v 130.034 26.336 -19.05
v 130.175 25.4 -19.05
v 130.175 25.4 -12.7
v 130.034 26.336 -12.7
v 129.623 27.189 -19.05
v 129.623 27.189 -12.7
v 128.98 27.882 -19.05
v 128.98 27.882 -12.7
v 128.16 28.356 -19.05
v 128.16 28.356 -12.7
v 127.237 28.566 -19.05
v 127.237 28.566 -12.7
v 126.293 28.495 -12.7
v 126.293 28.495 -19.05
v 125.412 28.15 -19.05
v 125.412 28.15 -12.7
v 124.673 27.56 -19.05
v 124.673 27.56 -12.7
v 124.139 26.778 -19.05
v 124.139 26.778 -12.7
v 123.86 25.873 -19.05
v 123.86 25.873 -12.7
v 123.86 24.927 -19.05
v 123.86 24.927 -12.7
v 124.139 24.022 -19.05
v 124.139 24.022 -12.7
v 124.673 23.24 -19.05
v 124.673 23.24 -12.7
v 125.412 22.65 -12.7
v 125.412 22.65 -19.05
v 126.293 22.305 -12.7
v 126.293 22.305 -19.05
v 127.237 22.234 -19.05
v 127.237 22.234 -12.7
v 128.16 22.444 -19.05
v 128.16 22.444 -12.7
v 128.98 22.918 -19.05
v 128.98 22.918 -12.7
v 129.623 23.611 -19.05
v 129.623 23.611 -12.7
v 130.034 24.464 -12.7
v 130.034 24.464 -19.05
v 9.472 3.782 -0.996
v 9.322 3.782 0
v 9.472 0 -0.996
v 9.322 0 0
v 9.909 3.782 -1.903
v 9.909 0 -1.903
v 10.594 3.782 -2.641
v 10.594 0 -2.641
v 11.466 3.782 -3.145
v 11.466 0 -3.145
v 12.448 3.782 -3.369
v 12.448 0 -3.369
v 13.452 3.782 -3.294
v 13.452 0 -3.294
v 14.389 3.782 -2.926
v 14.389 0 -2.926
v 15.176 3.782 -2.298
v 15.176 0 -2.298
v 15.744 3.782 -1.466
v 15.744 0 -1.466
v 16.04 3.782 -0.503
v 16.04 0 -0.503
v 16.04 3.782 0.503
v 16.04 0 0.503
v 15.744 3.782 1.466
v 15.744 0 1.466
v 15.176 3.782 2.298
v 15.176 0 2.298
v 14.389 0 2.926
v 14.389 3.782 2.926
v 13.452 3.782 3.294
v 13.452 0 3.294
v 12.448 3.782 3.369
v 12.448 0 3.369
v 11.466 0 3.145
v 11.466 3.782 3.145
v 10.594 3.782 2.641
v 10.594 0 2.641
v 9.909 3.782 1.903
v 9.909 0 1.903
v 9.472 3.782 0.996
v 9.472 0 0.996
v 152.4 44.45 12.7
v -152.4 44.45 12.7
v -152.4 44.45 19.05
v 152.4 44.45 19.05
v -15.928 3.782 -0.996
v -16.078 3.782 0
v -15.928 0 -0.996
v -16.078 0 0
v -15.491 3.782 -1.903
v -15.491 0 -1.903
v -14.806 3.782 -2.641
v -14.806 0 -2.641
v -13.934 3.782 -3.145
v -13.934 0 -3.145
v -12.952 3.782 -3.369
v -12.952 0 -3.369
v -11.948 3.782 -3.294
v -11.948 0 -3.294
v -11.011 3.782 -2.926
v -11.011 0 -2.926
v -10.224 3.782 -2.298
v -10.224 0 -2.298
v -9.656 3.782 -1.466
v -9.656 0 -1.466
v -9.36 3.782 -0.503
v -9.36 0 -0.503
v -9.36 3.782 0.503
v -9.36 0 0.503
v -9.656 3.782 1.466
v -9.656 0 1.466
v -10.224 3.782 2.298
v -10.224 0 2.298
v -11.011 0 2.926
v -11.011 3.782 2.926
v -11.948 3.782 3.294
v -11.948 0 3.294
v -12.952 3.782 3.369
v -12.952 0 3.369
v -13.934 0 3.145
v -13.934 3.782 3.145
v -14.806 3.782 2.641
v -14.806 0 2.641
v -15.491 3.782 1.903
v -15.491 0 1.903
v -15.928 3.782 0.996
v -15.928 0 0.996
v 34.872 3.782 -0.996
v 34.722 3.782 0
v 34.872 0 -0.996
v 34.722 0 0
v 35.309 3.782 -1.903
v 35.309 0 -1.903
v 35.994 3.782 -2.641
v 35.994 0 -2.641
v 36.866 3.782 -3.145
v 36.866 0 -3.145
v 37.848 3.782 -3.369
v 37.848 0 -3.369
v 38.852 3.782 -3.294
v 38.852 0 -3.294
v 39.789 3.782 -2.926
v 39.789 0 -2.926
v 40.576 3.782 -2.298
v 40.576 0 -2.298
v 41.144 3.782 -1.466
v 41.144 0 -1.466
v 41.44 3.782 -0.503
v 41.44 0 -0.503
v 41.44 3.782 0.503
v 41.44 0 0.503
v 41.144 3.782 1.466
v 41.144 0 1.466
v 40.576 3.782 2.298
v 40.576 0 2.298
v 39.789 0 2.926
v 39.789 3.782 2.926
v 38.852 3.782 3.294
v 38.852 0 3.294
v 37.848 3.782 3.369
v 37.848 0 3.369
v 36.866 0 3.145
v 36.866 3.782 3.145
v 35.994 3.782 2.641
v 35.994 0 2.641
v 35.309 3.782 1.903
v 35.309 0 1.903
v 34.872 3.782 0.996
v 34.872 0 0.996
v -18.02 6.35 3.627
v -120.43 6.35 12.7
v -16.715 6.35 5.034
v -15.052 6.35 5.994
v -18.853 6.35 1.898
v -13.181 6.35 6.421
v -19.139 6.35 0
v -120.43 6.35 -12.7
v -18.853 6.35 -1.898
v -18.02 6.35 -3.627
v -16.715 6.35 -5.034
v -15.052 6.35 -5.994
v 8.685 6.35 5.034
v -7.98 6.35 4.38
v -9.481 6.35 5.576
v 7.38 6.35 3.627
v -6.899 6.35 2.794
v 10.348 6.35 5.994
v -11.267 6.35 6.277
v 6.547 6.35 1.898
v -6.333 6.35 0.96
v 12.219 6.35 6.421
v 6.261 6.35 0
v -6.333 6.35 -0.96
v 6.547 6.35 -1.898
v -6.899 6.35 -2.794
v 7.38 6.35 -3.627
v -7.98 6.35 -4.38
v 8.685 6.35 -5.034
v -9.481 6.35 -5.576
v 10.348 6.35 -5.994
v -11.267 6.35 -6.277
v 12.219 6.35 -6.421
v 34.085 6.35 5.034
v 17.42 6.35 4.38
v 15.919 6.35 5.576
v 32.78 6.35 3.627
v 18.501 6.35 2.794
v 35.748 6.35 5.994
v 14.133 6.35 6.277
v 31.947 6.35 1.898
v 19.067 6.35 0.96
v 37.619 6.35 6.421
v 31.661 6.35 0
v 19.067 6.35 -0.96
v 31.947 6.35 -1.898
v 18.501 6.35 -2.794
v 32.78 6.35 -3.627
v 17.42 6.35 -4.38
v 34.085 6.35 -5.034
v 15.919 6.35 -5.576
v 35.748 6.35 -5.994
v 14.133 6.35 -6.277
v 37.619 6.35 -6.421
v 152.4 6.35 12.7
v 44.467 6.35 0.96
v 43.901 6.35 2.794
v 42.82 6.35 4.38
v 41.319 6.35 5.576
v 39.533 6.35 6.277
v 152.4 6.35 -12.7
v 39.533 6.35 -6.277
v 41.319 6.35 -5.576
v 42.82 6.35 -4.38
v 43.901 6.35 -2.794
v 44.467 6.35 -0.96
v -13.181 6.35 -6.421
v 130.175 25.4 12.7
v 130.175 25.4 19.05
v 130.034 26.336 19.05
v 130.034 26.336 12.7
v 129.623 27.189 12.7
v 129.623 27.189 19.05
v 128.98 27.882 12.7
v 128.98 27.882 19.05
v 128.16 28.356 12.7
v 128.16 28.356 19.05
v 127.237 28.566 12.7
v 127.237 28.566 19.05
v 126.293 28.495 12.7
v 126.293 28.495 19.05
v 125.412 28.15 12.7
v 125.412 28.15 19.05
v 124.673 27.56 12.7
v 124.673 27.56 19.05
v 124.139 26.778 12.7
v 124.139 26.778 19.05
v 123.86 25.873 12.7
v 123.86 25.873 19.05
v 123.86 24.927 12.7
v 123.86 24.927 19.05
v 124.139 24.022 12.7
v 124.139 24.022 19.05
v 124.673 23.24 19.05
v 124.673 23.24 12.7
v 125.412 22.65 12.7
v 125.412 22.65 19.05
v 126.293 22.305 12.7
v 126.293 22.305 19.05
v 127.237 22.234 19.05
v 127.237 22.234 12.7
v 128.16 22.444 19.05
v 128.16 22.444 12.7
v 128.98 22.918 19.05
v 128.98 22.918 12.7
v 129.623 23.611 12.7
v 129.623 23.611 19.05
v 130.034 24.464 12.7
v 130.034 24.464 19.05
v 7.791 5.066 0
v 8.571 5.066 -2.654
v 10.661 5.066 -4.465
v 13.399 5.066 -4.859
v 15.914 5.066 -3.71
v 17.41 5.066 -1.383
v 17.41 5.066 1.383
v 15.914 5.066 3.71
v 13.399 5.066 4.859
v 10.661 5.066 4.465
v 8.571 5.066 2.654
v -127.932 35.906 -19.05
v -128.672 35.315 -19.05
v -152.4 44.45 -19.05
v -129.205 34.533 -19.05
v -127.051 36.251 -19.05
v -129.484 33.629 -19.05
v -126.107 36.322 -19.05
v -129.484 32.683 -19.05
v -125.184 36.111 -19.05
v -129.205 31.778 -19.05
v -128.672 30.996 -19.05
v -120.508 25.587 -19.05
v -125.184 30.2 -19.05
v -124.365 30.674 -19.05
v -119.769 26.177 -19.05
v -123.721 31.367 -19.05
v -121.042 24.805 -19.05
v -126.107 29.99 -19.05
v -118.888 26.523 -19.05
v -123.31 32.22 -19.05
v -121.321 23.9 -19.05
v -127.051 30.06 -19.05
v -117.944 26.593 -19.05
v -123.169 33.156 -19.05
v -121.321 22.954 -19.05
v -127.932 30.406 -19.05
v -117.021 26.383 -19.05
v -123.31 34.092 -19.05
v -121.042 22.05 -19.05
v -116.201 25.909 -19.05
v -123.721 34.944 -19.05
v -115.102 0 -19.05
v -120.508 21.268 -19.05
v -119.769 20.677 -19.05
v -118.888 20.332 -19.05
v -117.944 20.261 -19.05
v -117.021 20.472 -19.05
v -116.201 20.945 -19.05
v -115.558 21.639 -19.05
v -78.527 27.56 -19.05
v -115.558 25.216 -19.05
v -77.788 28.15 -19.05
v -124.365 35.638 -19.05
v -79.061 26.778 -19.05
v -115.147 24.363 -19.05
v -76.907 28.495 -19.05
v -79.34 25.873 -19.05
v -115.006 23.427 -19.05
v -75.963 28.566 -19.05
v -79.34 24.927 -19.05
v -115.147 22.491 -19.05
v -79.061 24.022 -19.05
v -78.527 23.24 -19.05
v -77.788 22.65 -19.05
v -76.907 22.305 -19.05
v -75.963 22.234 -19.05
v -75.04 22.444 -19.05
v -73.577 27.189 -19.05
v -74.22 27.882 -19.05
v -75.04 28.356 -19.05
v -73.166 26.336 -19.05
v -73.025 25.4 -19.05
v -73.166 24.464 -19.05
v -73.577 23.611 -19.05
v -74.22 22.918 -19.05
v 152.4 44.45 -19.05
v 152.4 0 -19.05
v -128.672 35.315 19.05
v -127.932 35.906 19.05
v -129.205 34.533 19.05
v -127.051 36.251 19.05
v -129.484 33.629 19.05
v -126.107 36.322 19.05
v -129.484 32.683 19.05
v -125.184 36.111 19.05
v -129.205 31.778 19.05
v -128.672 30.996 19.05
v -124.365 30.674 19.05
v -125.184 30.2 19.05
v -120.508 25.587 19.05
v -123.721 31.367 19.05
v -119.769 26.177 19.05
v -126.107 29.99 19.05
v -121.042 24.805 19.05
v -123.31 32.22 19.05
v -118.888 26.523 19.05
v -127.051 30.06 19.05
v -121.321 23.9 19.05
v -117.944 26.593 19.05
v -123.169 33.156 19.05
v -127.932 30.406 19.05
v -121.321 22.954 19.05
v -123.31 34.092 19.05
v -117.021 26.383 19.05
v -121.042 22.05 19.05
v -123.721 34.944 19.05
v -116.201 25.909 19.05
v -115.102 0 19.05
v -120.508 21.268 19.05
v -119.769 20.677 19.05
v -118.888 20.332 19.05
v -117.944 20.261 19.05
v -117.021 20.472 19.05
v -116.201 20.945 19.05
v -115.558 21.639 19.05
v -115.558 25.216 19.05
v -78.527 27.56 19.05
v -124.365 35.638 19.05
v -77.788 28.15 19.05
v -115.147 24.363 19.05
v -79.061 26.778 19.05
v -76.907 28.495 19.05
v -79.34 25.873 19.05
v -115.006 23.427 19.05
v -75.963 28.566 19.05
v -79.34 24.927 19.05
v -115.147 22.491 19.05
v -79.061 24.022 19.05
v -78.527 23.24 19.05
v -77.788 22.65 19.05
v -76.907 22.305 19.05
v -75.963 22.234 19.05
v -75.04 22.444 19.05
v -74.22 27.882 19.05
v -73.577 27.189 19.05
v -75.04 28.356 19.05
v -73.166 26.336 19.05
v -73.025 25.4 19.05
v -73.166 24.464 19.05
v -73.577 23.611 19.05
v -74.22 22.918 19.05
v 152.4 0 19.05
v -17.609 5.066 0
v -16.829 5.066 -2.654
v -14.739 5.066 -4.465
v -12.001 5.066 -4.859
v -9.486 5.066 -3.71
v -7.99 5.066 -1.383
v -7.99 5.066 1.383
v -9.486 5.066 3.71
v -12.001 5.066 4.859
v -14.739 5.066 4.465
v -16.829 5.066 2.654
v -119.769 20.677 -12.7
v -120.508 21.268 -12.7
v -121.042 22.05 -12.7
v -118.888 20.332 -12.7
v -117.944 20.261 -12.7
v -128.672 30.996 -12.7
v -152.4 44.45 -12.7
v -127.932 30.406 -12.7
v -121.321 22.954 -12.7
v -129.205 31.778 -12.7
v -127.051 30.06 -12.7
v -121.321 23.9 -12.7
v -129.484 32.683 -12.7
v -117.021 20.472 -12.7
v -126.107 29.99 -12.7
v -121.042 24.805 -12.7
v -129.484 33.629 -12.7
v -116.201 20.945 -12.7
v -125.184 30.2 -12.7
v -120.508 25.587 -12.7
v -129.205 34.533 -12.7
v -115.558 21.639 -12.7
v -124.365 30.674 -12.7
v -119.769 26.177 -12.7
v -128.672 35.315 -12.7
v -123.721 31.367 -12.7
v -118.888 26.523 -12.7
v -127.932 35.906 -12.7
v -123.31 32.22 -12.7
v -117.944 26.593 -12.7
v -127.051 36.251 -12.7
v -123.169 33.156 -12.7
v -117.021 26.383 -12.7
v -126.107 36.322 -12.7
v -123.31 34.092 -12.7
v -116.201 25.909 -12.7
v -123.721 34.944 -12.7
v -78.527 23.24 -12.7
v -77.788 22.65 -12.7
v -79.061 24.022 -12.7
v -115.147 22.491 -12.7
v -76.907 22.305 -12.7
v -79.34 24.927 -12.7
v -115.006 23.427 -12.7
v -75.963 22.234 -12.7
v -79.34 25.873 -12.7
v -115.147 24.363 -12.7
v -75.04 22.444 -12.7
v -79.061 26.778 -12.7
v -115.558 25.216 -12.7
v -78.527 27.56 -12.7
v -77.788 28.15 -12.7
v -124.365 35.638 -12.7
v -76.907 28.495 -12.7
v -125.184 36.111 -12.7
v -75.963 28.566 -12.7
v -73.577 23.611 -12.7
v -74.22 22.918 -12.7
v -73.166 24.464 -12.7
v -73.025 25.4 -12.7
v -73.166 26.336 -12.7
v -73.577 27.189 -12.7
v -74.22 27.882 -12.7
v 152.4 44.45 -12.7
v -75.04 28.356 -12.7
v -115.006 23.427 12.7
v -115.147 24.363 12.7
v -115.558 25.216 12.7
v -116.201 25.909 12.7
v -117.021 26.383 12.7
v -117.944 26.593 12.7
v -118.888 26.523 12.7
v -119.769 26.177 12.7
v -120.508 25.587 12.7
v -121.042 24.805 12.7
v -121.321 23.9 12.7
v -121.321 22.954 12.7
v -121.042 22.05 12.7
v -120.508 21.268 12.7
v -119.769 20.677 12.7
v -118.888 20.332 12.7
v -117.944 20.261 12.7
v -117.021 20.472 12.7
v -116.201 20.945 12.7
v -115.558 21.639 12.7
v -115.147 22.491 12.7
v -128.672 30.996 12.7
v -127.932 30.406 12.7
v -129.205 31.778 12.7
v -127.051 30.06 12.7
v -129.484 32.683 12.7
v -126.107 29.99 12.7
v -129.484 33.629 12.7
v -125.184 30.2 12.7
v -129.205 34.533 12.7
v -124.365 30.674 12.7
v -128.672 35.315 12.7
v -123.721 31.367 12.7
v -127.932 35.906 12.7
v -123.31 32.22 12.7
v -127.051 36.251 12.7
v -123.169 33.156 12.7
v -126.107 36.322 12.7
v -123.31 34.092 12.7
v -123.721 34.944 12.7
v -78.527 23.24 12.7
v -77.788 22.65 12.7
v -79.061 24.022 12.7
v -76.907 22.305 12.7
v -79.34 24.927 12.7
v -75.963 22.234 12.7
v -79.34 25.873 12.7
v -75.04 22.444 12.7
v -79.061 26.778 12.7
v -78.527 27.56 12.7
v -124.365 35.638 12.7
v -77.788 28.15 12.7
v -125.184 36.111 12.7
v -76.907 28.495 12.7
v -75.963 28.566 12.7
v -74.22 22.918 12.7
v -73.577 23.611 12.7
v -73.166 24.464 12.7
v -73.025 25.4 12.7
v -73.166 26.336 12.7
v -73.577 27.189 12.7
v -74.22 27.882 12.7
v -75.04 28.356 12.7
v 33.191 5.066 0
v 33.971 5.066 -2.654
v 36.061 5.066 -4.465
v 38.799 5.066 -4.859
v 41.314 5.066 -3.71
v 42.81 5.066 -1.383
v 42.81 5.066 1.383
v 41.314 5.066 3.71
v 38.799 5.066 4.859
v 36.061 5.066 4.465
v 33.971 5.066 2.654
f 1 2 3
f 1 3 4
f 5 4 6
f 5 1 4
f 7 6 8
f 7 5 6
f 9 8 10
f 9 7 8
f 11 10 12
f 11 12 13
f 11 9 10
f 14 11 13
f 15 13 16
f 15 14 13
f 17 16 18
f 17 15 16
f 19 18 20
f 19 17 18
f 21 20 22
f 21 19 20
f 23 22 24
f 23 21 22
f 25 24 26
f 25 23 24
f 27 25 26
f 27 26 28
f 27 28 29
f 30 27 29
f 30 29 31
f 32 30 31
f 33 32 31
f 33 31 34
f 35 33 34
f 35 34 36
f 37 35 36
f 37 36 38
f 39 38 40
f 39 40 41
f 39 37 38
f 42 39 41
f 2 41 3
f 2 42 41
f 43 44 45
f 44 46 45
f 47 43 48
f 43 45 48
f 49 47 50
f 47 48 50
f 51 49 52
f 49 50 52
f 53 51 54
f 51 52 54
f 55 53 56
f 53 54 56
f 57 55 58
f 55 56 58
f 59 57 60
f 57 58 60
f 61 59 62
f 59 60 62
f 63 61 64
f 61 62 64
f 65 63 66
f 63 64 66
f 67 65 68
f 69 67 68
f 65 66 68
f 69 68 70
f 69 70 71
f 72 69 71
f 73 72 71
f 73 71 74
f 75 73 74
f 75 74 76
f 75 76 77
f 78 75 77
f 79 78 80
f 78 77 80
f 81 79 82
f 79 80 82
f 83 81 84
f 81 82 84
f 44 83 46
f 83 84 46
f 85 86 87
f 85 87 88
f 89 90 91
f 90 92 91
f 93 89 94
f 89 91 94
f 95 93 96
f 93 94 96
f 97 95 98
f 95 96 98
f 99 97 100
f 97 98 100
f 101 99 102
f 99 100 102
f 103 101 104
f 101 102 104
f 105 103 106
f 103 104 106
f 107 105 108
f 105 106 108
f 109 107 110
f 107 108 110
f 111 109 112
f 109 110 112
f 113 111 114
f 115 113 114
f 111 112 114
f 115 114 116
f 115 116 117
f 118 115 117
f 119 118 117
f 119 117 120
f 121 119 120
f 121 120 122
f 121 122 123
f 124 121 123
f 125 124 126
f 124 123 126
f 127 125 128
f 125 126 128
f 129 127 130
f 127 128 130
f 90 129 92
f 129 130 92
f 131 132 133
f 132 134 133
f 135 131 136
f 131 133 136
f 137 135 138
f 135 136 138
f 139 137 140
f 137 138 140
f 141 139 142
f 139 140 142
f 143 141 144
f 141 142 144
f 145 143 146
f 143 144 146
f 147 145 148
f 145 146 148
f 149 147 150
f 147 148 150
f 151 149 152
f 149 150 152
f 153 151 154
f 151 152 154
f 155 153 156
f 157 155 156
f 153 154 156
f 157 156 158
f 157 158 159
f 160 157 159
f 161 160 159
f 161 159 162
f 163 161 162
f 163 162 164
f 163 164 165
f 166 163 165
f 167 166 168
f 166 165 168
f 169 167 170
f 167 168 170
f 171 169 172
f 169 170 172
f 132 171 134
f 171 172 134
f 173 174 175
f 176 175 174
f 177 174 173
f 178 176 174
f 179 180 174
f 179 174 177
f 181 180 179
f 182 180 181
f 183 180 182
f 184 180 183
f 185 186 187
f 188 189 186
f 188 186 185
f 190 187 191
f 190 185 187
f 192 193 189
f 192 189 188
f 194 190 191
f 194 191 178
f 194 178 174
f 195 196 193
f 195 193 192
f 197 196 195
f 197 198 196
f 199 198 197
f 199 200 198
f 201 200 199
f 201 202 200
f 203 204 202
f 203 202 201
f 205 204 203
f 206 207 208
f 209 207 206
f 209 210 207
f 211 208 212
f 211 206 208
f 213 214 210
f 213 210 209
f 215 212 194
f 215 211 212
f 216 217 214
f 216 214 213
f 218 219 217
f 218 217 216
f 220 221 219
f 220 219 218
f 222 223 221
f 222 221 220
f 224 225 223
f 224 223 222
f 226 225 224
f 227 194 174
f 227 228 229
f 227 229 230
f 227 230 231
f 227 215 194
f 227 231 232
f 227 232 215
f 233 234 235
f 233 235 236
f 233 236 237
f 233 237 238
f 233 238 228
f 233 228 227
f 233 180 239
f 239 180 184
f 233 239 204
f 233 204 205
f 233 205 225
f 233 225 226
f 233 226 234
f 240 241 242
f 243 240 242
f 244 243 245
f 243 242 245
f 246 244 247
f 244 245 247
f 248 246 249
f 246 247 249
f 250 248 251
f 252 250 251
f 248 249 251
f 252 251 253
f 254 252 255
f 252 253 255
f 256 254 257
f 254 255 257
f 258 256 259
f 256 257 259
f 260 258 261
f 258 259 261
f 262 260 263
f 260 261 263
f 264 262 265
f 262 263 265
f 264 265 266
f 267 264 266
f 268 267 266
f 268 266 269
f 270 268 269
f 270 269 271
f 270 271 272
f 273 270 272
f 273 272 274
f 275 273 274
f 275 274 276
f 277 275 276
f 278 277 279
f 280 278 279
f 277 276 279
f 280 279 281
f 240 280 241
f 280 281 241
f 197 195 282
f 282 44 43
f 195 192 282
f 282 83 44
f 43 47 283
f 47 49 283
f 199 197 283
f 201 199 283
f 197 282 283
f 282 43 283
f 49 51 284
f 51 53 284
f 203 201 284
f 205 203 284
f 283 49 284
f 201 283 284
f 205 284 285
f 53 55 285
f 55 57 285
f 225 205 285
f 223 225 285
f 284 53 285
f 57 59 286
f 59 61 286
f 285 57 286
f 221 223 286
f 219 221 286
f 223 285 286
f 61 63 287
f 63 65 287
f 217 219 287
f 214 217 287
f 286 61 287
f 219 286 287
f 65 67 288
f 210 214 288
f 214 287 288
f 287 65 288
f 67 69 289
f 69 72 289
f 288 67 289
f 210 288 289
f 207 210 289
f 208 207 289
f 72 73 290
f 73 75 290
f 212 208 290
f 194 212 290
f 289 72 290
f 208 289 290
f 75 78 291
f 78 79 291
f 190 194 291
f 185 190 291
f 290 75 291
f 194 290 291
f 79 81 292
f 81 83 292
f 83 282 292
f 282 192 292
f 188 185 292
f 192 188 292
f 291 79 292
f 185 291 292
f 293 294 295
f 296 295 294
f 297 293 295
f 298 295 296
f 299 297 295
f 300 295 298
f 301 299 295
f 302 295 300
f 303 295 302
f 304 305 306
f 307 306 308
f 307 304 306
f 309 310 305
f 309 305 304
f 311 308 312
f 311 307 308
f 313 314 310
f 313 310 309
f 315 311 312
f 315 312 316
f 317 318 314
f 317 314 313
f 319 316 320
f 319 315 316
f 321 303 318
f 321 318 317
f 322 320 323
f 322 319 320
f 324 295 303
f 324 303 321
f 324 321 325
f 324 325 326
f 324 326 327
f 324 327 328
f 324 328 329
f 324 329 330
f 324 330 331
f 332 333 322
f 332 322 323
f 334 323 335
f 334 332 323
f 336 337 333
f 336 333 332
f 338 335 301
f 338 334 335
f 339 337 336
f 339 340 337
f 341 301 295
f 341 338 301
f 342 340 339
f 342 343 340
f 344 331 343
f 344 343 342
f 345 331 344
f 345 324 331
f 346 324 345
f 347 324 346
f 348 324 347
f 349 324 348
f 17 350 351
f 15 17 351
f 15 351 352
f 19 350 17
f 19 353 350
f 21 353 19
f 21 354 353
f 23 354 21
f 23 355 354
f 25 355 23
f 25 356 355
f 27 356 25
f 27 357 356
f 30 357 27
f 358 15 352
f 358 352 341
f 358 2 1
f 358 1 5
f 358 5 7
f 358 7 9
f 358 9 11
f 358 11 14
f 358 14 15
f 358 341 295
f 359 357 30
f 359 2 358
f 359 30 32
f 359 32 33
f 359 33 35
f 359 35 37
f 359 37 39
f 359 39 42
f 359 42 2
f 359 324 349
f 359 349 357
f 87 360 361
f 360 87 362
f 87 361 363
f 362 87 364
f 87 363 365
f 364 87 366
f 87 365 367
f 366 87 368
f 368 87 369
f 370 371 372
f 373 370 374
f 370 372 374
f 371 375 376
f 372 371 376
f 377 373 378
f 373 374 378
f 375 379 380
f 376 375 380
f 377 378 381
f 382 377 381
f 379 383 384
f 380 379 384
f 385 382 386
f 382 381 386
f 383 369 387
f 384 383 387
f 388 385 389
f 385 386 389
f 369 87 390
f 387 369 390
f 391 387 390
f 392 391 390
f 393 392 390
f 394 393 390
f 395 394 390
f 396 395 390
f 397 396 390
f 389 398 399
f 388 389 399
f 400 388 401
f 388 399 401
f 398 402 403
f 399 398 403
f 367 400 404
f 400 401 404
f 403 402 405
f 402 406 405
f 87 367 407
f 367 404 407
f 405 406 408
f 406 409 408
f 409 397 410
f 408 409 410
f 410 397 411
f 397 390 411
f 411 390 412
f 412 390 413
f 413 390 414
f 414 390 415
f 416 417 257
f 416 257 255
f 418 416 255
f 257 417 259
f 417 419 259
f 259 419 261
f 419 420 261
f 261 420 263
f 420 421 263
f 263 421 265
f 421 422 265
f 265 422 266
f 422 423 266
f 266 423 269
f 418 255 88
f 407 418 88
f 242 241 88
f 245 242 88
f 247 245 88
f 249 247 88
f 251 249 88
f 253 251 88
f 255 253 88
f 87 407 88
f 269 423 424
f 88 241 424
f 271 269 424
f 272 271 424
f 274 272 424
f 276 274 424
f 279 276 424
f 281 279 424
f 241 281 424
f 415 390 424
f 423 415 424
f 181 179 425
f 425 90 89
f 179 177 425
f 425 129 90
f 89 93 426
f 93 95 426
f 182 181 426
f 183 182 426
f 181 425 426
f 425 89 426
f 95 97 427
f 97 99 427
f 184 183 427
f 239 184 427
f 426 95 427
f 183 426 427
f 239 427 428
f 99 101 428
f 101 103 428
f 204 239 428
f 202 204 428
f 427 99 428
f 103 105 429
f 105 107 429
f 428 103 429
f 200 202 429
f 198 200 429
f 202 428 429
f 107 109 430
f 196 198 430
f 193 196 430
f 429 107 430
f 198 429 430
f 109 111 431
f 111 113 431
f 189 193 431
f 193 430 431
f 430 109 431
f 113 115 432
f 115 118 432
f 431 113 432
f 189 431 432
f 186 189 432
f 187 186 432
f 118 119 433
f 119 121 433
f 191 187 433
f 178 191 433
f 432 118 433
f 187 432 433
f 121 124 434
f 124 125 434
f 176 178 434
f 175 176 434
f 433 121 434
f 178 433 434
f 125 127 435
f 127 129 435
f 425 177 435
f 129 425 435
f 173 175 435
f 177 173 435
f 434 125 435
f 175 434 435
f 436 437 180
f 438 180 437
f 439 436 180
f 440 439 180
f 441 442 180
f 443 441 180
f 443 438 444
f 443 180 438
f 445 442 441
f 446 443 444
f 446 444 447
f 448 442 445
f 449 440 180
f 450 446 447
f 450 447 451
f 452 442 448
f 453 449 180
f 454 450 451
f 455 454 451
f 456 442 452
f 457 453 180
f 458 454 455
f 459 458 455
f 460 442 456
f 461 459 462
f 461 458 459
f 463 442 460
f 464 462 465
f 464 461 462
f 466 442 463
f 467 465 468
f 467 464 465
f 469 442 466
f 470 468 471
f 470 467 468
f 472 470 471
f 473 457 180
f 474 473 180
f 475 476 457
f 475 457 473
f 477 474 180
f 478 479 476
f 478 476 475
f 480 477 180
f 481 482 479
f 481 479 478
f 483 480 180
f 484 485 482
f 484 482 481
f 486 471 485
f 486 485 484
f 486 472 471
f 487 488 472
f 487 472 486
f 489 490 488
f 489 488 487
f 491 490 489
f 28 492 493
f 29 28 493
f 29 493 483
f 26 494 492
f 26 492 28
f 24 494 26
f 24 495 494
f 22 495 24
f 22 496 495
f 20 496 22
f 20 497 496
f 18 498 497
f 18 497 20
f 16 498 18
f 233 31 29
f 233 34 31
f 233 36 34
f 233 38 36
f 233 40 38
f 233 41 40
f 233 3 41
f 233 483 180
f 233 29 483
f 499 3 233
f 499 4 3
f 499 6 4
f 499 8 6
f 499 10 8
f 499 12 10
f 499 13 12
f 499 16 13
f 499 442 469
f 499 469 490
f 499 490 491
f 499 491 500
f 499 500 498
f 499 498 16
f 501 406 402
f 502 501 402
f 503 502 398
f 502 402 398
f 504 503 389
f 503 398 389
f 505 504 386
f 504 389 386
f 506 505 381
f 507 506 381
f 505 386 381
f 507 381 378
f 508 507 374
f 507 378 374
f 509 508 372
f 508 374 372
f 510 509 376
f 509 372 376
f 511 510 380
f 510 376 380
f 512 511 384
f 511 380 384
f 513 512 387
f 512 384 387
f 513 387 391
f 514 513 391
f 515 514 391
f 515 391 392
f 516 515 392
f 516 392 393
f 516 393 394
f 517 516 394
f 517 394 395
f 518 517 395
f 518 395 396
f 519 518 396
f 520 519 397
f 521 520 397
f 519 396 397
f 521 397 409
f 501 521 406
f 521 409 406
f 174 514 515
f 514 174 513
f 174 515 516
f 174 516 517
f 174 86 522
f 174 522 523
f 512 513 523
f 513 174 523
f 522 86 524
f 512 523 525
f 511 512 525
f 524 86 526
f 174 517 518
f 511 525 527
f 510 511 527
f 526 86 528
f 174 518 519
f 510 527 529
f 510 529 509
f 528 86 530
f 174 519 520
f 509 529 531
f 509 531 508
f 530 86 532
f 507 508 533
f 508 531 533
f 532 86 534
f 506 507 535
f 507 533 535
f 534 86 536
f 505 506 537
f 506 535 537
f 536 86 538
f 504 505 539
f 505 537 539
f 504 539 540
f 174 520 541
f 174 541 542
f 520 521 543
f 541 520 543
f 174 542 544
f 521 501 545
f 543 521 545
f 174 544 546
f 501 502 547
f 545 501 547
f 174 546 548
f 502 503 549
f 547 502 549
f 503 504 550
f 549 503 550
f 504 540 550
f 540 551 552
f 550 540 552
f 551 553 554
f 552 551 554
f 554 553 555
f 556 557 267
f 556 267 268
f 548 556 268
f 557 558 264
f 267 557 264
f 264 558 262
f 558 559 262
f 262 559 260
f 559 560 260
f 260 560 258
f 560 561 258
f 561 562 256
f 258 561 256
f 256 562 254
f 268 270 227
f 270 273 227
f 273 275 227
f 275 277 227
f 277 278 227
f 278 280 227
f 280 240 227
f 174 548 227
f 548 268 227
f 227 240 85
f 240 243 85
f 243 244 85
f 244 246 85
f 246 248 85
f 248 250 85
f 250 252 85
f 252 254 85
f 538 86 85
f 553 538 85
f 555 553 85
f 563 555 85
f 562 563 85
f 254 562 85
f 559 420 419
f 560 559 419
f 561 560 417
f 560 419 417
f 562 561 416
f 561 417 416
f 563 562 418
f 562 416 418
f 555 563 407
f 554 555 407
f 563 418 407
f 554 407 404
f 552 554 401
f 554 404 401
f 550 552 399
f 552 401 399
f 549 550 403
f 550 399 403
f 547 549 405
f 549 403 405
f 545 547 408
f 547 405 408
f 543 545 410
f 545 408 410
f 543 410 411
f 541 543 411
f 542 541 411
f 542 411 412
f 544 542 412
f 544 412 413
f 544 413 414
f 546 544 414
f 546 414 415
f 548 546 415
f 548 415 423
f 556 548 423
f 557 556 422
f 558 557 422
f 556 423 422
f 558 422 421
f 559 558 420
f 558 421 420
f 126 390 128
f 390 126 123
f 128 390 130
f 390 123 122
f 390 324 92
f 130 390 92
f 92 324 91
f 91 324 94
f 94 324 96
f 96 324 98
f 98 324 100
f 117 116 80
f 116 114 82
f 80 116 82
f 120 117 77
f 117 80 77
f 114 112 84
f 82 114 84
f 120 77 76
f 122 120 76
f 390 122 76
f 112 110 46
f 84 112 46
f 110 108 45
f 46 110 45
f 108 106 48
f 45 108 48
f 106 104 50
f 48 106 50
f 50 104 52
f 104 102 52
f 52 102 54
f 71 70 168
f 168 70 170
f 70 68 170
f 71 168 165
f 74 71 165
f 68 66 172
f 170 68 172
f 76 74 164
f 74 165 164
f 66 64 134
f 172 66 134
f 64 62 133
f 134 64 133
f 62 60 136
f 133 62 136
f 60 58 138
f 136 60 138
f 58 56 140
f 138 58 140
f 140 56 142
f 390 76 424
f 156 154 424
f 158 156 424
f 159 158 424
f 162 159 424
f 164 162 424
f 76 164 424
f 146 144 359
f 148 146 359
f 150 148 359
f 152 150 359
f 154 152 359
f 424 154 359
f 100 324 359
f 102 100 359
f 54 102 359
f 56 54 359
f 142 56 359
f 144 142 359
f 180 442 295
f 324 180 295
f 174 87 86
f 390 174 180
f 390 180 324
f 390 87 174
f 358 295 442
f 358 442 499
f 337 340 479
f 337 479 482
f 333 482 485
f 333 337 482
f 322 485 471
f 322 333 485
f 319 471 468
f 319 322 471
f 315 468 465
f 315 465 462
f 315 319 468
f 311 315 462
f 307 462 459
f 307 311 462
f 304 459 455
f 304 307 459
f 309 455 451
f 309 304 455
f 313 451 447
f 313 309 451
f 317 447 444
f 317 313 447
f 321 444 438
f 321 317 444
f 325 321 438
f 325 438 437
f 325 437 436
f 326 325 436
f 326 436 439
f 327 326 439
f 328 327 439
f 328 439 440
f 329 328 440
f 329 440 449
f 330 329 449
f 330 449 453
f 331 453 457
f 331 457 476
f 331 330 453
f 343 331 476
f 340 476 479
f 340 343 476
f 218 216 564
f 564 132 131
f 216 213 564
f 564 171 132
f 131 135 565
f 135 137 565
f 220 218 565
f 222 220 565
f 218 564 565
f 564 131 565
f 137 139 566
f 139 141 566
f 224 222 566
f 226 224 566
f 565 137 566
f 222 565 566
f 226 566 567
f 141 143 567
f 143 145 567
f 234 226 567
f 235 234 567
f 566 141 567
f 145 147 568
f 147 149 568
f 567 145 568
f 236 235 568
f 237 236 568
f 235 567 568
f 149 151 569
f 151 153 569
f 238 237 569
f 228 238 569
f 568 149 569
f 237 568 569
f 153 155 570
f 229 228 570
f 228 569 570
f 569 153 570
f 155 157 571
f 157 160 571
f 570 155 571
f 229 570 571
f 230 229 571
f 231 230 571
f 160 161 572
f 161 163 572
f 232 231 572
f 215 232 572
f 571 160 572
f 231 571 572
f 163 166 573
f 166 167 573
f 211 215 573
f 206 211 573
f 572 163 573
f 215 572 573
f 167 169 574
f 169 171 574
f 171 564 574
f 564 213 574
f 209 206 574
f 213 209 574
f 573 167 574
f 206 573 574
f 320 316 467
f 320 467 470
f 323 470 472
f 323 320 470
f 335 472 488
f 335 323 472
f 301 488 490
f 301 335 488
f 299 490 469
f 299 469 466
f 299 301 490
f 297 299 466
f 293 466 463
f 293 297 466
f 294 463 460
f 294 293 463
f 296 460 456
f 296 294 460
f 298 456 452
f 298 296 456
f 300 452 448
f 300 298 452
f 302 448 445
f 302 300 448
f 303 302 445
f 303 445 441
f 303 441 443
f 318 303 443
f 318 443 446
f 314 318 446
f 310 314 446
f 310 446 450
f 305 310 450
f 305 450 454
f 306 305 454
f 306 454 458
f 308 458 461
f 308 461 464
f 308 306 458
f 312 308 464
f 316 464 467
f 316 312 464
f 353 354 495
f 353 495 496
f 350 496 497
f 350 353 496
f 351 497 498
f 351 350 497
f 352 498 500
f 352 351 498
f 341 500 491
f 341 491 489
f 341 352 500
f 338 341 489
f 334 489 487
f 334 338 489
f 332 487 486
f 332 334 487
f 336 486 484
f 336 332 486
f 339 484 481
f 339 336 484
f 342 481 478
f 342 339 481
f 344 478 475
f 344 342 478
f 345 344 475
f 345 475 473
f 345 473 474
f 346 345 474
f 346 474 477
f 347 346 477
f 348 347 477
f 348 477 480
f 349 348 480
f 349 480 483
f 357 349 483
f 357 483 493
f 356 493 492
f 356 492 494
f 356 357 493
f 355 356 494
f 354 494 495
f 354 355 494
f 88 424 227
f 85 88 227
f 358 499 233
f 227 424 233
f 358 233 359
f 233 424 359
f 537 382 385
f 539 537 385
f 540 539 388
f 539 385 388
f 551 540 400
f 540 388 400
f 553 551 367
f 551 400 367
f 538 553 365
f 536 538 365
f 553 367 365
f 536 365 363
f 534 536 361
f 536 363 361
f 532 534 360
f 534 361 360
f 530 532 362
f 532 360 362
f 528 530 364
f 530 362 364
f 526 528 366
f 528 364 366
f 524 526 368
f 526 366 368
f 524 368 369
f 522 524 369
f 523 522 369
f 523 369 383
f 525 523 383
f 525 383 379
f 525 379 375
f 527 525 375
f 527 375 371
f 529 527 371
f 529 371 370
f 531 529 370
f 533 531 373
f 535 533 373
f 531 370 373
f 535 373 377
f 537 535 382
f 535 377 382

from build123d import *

# Parameters (mm, degrees)
SKETCH1_W                                            = 304.8
SKETCH1_H                                            = 38.1
BOSS_EXTRUDE1_DEPTH                                  = 44.45
SKETCH2_W                                            = 304.8
SKETCH2_H                                            = 25.4
CUT_EXTRUDE1_DEPTH                                   = 38.1
CUT_EXTRUDE3_DEPTH                                   = 38.1
SKETCH5_R                                            = 3.175
CUT_EXTRUDE4_DEPTH                                   = 6.35
CSK_SLOT_FOR_1_4_FLAT_HEAD_MACHINE_SCREW_D           = 6.7564
CSK_SLOT_FOR_1_4_FLAT_HEAD_MACHINE_SCREW_CSINK_D     = 12.8778
CSK_SLOT_FOR_1_4_FLAT_HEAD_MACHINE_SCREW_CSINK_ANGLE = 100
SKETCH12_R                                           = 3.175
CUT_EXTRUDE5_DEPTH                                   = 6.35


with BuildPart() as part:
    # Sketch1 → Boss-Extrude1 (new body)
    with BuildSketch(Plane(origin=(0, 0, 0), x_dir=(1, 0, 0), z_dir=(0, 1, 0))):
        Rectangle(SKETCH1_W, SKETCH1_H)
    extrude(amount=BOSS_EXTRUDE1_DEPTH)

    # Sketch2 → Cut-Extrude1 (cut)
    with BuildSketch(Plane(origin=(0, 44.45, 0), x_dir=(1, 0, 0), z_dir=(0, 1, 0))):
        Rectangle(SKETCH2_W, SKETCH2_H)
    extrude(amount=-CUT_EXTRUDE1_DEPTH, mode=Mode.SUBTRACT)

    # Sketch4 → Cut-Extrude3 (cut)
    with BuildSketch(Plane.XY.offset(19.05)):
        Polygon((-152.4, 44.45), (-115.102021394, 0), (-152.4, 0), align=None)
    extrude(amount=-CUT_EXTRUDE3_DEPTH, mode=Mode.SUBTRACT)

    # Sketch5 → Cut-Extrude4 (cut)
    with BuildSketch(Plane.XY.offset(19.05)):
        with Locations((-126.344430286, 33.155873788)):
            Circle(SKETCH5_R)
        with Locations((-118.181027643, 23.42710936)):
            Circle(SKETCH5_R)
    cut_extrude4 = extrude(amount=-CUT_EXTRUDE4_DEPTH, mode=Mode.SUBTRACT)

    # Mirror1: Cut-Extrude4 across plane
    add(cut_extrude4.mirror(Plane.XY), mode=Mode.SUBTRACT)

    # CSK SLOT for 1/4 Flat Head Machine Screw (100)1 (through all)
    with Locations(Plane(origin=(0, 6.35, 0), x_dir=(1, 0, 0), z_dir=(0, 1, 0))):
        with Locations((-12.7, 0), (12.7, 0), (38.1, 0)):
            CounterSinkHole(CSK_SLOT_FOR_1_4_FLAT_HEAD_MACHINE_SCREW_D / 2, CSK_SLOT_FOR_1_4_FLAT_HEAD_MACHINE_SCREW_CSINK_D / 2, counter_sink_angle=CSK_SLOT_FOR_1_4_FLAT_HEAD_MACHINE_SCREW_CSINK_ANGLE)

    # Sketch12 → Cut-Extrude5 (cut)
    with BuildSketch(Plane.XY.offset(19.05)):
        with Locations((-76.2, 25.4)):
            Circle(SKETCH12_R)
        with Locations((127, 25.4)):
            Circle(SKETCH12_R)
    cut_extrude5 = extrude(amount=-CUT_EXTRUDE5_DEPTH, mode=Mode.SUBTRACT)

    # Mirror2: Cut-Extrude5 across plane
    add(cut_extrude5.mirror(Plane.XY), mode=Mode.SUBTRACT)


solid = part.part
